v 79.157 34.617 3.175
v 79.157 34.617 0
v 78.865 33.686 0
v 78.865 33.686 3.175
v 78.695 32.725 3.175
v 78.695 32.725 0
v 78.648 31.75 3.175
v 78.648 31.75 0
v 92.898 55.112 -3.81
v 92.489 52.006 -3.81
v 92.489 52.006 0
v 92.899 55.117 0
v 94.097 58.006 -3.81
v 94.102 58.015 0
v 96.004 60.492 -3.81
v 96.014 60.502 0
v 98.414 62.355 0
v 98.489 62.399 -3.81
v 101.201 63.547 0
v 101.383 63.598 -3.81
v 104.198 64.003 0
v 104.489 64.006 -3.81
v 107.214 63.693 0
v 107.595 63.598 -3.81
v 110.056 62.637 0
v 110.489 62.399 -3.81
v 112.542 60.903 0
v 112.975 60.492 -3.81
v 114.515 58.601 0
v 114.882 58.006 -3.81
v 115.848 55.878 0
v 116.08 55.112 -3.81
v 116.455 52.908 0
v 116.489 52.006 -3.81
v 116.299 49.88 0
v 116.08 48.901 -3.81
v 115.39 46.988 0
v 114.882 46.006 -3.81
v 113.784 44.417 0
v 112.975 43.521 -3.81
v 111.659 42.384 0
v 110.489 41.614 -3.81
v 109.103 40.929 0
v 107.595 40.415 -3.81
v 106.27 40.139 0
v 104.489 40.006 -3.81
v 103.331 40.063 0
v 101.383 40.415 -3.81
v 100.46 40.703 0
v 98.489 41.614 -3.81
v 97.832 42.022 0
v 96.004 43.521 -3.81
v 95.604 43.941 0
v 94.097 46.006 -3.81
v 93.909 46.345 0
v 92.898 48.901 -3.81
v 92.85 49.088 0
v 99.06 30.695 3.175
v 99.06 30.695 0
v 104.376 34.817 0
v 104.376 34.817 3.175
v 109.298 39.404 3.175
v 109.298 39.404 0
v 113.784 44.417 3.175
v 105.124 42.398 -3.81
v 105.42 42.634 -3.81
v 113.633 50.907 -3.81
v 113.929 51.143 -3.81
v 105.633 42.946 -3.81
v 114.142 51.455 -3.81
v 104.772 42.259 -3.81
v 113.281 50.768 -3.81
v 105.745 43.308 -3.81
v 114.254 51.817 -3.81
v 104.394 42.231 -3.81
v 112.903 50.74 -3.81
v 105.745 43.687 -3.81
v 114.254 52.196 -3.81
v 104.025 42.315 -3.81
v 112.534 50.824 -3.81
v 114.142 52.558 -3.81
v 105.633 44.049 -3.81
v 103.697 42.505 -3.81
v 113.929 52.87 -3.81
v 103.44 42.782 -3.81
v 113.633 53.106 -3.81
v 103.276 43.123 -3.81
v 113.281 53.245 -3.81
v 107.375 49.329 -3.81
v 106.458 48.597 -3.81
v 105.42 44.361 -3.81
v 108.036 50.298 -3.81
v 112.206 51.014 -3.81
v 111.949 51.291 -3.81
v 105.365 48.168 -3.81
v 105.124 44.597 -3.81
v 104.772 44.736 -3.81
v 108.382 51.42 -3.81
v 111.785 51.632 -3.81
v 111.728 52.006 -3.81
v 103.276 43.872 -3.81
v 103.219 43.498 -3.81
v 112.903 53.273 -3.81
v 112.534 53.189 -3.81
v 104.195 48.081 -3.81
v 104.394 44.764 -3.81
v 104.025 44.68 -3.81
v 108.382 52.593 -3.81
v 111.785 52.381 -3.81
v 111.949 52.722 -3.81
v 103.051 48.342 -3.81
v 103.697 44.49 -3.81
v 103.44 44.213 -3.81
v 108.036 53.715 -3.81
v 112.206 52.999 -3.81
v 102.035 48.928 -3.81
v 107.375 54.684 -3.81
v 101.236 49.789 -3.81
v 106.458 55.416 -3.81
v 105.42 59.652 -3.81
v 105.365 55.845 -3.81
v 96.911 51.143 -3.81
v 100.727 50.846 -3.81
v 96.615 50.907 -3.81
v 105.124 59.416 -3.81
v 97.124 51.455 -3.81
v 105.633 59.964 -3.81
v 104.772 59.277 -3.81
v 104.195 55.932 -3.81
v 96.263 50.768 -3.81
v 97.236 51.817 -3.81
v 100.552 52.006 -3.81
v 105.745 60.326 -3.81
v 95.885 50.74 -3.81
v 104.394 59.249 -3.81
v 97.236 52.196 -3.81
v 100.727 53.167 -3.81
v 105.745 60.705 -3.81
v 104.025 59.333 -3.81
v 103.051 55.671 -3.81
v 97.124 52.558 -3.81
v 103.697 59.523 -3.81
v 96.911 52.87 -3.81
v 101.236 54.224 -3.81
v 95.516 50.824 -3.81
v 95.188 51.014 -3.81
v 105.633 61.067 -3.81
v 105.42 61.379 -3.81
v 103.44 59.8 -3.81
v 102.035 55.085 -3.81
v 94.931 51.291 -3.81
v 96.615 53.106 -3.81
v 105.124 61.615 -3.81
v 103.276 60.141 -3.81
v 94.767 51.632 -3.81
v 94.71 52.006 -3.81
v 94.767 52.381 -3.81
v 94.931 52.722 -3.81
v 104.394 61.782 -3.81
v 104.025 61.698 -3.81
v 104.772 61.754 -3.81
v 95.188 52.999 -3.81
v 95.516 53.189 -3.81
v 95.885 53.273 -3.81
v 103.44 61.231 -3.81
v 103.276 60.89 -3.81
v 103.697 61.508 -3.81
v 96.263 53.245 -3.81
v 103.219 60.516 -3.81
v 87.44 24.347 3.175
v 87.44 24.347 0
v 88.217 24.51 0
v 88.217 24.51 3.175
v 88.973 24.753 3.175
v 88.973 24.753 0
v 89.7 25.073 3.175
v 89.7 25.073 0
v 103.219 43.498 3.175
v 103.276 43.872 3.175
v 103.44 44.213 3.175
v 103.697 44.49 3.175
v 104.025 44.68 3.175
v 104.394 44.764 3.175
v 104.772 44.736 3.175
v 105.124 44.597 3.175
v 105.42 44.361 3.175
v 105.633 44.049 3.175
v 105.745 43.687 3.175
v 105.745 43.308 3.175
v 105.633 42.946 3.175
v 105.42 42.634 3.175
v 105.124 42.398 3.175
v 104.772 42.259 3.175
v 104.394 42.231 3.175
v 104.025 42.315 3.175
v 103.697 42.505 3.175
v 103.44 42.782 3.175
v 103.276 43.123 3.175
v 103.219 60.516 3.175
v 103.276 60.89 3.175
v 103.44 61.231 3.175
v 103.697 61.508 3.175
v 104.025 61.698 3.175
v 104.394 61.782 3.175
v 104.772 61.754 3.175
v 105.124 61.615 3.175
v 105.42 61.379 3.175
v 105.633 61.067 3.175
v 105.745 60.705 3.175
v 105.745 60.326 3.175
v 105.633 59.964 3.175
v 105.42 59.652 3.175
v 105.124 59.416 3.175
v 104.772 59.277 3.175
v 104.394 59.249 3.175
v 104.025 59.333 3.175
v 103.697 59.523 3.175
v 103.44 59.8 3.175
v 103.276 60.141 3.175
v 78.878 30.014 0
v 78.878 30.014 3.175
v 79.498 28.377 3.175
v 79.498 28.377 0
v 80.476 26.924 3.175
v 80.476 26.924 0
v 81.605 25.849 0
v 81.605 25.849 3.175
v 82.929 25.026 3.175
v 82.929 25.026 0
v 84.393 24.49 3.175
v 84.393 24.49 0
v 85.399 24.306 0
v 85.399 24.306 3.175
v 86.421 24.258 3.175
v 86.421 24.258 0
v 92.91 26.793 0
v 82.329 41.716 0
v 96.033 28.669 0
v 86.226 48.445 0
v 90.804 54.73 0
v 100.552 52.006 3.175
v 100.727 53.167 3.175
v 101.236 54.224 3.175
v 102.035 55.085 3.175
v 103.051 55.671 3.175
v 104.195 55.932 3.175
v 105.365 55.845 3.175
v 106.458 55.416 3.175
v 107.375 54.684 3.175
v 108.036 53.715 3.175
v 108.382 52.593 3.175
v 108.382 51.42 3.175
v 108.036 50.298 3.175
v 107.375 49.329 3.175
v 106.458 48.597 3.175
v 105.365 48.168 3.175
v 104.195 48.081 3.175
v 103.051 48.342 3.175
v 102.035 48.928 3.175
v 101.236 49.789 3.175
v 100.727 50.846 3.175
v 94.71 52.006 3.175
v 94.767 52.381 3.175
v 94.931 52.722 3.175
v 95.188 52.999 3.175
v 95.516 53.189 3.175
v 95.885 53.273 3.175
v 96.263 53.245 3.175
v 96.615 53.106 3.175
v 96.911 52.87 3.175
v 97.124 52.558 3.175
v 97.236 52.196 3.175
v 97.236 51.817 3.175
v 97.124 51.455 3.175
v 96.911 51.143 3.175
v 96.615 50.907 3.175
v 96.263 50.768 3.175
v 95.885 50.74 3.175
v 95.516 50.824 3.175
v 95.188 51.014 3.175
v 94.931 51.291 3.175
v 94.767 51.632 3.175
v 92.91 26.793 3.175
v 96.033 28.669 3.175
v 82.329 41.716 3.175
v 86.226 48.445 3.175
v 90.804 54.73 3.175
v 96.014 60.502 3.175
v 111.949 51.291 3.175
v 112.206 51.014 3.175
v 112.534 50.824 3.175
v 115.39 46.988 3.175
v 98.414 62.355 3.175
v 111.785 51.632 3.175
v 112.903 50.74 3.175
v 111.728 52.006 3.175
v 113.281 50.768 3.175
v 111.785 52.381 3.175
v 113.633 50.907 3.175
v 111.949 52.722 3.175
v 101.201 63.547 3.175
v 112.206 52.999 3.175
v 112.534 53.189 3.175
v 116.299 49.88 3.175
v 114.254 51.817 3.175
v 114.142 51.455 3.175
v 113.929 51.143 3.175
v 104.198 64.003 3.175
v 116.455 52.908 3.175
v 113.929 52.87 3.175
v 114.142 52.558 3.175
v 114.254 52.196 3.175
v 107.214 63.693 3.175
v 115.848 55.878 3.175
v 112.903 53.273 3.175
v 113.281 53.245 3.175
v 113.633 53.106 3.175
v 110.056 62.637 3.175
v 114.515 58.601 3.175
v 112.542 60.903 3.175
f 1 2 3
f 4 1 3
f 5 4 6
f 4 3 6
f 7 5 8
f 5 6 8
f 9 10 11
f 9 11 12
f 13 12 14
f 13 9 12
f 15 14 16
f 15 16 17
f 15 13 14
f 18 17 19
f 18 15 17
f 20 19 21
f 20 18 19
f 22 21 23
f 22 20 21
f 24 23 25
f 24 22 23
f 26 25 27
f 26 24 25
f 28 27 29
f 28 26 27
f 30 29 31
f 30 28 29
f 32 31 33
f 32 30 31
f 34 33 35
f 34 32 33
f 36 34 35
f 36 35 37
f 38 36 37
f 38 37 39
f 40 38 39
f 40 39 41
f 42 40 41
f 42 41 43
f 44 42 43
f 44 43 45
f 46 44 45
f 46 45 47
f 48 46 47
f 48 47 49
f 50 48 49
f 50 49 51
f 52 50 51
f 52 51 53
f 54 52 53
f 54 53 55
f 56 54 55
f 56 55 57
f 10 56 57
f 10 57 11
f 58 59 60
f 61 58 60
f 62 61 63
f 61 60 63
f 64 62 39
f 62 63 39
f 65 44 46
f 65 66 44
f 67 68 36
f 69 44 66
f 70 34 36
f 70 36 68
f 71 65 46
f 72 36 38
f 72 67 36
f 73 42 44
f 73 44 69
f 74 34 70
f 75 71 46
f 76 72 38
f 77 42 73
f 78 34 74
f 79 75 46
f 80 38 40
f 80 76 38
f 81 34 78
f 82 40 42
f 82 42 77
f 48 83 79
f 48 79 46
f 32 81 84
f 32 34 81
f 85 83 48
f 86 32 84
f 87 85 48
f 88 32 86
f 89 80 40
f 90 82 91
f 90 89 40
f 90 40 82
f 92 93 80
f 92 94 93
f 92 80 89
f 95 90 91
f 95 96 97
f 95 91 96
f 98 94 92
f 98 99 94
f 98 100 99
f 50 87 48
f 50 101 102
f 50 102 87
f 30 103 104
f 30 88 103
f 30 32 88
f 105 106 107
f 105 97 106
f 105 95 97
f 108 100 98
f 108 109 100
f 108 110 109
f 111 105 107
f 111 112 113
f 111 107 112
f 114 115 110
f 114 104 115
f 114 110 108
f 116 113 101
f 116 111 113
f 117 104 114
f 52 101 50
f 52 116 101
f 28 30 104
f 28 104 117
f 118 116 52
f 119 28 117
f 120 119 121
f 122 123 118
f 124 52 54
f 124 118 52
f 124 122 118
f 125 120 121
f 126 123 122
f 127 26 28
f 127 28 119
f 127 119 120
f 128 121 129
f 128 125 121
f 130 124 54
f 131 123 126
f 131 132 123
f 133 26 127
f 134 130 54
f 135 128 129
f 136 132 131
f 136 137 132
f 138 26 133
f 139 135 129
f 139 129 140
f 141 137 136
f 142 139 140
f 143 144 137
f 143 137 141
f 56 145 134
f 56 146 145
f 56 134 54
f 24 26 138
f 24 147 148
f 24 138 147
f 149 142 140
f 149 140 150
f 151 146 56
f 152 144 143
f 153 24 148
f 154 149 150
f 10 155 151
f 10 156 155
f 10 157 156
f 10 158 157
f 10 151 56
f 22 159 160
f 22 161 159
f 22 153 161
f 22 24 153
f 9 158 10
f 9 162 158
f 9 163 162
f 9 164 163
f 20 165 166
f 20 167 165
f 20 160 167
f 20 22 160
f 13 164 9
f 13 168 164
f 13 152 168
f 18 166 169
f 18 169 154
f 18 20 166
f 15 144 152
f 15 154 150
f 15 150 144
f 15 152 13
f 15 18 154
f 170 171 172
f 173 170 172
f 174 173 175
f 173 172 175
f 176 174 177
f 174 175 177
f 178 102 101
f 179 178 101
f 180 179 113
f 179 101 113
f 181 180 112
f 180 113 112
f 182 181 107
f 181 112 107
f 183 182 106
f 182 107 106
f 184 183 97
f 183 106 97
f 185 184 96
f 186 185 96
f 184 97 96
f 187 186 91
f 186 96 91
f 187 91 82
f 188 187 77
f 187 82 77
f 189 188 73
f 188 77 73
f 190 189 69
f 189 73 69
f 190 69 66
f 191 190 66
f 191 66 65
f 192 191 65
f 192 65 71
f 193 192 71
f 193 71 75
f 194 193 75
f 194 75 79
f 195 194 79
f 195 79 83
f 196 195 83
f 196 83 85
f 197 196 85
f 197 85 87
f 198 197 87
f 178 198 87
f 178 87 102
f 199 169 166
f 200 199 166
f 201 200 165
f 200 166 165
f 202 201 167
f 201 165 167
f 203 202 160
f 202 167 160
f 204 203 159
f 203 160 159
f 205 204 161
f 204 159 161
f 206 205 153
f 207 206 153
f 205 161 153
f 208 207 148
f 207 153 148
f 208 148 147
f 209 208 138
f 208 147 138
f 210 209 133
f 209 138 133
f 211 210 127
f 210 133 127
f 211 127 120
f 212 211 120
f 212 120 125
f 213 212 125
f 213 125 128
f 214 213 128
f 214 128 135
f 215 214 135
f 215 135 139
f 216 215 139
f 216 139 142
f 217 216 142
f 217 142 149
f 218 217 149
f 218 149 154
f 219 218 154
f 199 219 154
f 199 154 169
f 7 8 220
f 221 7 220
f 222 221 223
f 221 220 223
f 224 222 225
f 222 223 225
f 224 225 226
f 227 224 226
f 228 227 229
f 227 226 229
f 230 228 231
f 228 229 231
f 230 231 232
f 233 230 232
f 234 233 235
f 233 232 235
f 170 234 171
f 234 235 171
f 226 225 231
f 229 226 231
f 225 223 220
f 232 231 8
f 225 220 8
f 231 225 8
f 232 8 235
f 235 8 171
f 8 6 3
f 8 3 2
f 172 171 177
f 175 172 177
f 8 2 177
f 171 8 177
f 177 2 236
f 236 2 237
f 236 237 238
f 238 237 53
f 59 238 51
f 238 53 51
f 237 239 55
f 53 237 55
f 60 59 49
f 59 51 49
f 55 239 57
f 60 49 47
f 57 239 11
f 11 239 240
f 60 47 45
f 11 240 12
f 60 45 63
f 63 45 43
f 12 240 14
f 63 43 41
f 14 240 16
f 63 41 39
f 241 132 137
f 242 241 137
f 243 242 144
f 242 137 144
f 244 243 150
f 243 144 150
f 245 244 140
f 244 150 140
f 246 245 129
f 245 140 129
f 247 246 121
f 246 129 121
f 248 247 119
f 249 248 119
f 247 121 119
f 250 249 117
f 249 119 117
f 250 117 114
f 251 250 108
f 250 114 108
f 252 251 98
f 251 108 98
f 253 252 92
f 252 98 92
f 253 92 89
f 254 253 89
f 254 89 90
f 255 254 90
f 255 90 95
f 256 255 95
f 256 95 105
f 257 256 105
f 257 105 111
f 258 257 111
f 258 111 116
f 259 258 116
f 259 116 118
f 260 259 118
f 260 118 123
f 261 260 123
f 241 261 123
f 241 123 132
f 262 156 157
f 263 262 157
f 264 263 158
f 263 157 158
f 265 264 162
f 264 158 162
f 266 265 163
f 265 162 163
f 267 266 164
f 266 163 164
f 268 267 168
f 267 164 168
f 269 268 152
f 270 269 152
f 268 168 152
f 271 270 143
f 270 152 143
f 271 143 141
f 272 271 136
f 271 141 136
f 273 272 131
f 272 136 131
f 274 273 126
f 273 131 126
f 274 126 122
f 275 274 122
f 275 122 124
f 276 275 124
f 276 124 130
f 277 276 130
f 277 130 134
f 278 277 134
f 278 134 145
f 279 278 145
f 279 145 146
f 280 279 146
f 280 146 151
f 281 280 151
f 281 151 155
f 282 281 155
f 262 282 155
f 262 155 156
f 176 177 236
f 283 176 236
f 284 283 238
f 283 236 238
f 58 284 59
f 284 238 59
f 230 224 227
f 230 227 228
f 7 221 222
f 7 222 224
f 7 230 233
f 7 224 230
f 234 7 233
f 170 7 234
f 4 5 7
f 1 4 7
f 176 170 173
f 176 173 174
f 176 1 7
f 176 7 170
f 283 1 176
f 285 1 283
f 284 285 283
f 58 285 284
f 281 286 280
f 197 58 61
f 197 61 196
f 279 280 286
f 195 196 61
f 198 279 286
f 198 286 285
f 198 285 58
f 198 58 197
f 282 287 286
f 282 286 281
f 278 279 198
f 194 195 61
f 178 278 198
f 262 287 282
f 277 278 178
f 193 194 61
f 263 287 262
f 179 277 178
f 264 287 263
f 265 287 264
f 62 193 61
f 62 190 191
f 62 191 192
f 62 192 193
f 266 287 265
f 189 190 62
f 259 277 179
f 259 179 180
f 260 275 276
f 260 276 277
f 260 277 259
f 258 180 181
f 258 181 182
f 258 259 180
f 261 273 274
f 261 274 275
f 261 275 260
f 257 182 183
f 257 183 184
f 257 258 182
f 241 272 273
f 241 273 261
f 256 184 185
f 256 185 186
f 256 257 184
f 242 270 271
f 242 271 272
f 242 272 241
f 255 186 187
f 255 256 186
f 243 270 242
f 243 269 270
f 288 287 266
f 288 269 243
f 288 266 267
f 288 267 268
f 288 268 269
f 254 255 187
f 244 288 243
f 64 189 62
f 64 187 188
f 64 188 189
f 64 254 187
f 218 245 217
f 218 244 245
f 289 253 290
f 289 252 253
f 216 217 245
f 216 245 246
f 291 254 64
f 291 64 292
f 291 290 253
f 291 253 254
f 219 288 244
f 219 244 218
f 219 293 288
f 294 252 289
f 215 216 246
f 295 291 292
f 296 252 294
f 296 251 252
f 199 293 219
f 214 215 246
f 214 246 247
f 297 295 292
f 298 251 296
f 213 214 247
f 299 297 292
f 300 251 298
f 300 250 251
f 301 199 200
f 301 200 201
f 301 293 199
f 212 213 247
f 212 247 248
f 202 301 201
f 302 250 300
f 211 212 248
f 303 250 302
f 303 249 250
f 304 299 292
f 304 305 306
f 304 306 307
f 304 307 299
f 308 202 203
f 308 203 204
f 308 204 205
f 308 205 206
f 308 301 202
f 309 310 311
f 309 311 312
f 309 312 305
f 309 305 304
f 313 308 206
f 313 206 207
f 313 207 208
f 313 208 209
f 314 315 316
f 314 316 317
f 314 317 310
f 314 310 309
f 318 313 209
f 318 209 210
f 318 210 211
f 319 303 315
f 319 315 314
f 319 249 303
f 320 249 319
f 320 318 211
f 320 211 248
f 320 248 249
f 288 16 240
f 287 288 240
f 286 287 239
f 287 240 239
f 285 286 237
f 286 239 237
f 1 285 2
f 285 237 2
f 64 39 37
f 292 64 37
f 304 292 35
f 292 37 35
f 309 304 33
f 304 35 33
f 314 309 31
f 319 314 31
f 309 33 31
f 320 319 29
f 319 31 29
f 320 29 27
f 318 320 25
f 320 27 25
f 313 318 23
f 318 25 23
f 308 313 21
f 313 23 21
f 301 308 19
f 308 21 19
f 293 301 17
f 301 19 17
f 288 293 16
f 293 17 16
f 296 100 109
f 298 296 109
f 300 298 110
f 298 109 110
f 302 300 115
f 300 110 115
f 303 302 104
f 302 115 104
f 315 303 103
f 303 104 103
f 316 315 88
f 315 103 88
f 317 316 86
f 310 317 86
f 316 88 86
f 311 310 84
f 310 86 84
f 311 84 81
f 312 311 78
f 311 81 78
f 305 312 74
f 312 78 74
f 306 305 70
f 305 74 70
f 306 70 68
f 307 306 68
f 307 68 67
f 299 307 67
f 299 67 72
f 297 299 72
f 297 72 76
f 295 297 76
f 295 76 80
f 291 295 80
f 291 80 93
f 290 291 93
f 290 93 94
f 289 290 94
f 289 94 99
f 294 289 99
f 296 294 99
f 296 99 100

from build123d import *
from build123d.topology import SkipClean

# Parameters (mm, degrees)
BOSS_EXTRUDE1_DEPTH = 3.175
BOSS_EXTRUDE2_START = 3.81
SKETCH2_R           = 12
BOSS_EXTRUDE2_DEPTH = 3.81
SKETCH3_R           = 3.937
CUT_EXTRUDE1_DEPTH  = 134.099089527
SKETCH4_R           = 1.27
CUT_EXTRUDE2_DEPTH  = 134.099089527


with BuildPart() as part:
    # Sketch1 → Boss-Extrude1 (new body)
    with BuildSketch(Plane.XY):
        with BuildLine():
            ThreePointArc((113.784062988, 44.416608597), (112.542436022, 60.902914722), (96.014300162, 60.502100346))
            ThreePointArc((96.014300162, 60.502100346), (86.225733854, 48.445051897), (79.156979953, 34.616777747))
            ThreePointArc((79.156979953, 34.616777747), (81.153408489, 26.227218543), (89.699693339, 25.073335615))
            ThreePointArc((89.699693339, 25.073335615), (102.758092485, 33.479680479), (113.784062988, 44.416608597))
        make_face()
    extrude(amount=BOSS_EXTRUDE1_DEPTH)

    # Sketch2 → Boss-Extrude2 (add)
    with SkipClean():  # the faces are left unmerged after this step: merging them gives an invalid solid
        with BuildSketch(Plane(origin=(0, 0, 0), x_dir=(-1, 0, 0), z_dir=(0, 0, -1)).offset(BOSS_EXTRUDE2_START)):
            with Locations((-104.48925, 52.0065)):
                Circle(SKETCH2_R)
        extrude(amount=-BOSS_EXTRUDE2_DEPTH)

    # Sketch3 → Cut-Extrude1 (cut, through all)
    with SkipClean():  # the faces are left unmerged after this step: merging them gives an invalid solid
        with BuildSketch(Plane(origin=(0, 0, -3.81), x_dir=(-1, 0, 0), z_dir=(0, 0, -1))):
            with Locations((-104.48925, 52.0065)):
                Circle(SKETCH3_R)
        extrude(amount=-CUT_EXTRUDE1_DEPTH, mode=Mode.SUBTRACT)

    # Sketch4 → Cut-Extrude2 (cut, through all)
    with SkipClean():  # the faces are left unmerged after this step: merging them gives an invalid solid
        with BuildSketch(Plane(origin=(0, 0, -3.81), x_dir=(-1, 0, 0), z_dir=(0, 0, -1))):
            with Locations((-95.98025, 52.0065)):
                Circle(SKETCH4_R)
            with Locations((-112.99825, 52.0065)):
                Circle(SKETCH4_R)
            with Locations((-104.48925, 43.4975)):
                Circle(SKETCH4_R)
            with Locations((-104.48925, 60.5155)):
                Circle(SKETCH4_R)
        extrude(amount=-CUT_EXTRUDE2_DEPTH, mode=Mode.SUBTRACT)


solid = part.part
